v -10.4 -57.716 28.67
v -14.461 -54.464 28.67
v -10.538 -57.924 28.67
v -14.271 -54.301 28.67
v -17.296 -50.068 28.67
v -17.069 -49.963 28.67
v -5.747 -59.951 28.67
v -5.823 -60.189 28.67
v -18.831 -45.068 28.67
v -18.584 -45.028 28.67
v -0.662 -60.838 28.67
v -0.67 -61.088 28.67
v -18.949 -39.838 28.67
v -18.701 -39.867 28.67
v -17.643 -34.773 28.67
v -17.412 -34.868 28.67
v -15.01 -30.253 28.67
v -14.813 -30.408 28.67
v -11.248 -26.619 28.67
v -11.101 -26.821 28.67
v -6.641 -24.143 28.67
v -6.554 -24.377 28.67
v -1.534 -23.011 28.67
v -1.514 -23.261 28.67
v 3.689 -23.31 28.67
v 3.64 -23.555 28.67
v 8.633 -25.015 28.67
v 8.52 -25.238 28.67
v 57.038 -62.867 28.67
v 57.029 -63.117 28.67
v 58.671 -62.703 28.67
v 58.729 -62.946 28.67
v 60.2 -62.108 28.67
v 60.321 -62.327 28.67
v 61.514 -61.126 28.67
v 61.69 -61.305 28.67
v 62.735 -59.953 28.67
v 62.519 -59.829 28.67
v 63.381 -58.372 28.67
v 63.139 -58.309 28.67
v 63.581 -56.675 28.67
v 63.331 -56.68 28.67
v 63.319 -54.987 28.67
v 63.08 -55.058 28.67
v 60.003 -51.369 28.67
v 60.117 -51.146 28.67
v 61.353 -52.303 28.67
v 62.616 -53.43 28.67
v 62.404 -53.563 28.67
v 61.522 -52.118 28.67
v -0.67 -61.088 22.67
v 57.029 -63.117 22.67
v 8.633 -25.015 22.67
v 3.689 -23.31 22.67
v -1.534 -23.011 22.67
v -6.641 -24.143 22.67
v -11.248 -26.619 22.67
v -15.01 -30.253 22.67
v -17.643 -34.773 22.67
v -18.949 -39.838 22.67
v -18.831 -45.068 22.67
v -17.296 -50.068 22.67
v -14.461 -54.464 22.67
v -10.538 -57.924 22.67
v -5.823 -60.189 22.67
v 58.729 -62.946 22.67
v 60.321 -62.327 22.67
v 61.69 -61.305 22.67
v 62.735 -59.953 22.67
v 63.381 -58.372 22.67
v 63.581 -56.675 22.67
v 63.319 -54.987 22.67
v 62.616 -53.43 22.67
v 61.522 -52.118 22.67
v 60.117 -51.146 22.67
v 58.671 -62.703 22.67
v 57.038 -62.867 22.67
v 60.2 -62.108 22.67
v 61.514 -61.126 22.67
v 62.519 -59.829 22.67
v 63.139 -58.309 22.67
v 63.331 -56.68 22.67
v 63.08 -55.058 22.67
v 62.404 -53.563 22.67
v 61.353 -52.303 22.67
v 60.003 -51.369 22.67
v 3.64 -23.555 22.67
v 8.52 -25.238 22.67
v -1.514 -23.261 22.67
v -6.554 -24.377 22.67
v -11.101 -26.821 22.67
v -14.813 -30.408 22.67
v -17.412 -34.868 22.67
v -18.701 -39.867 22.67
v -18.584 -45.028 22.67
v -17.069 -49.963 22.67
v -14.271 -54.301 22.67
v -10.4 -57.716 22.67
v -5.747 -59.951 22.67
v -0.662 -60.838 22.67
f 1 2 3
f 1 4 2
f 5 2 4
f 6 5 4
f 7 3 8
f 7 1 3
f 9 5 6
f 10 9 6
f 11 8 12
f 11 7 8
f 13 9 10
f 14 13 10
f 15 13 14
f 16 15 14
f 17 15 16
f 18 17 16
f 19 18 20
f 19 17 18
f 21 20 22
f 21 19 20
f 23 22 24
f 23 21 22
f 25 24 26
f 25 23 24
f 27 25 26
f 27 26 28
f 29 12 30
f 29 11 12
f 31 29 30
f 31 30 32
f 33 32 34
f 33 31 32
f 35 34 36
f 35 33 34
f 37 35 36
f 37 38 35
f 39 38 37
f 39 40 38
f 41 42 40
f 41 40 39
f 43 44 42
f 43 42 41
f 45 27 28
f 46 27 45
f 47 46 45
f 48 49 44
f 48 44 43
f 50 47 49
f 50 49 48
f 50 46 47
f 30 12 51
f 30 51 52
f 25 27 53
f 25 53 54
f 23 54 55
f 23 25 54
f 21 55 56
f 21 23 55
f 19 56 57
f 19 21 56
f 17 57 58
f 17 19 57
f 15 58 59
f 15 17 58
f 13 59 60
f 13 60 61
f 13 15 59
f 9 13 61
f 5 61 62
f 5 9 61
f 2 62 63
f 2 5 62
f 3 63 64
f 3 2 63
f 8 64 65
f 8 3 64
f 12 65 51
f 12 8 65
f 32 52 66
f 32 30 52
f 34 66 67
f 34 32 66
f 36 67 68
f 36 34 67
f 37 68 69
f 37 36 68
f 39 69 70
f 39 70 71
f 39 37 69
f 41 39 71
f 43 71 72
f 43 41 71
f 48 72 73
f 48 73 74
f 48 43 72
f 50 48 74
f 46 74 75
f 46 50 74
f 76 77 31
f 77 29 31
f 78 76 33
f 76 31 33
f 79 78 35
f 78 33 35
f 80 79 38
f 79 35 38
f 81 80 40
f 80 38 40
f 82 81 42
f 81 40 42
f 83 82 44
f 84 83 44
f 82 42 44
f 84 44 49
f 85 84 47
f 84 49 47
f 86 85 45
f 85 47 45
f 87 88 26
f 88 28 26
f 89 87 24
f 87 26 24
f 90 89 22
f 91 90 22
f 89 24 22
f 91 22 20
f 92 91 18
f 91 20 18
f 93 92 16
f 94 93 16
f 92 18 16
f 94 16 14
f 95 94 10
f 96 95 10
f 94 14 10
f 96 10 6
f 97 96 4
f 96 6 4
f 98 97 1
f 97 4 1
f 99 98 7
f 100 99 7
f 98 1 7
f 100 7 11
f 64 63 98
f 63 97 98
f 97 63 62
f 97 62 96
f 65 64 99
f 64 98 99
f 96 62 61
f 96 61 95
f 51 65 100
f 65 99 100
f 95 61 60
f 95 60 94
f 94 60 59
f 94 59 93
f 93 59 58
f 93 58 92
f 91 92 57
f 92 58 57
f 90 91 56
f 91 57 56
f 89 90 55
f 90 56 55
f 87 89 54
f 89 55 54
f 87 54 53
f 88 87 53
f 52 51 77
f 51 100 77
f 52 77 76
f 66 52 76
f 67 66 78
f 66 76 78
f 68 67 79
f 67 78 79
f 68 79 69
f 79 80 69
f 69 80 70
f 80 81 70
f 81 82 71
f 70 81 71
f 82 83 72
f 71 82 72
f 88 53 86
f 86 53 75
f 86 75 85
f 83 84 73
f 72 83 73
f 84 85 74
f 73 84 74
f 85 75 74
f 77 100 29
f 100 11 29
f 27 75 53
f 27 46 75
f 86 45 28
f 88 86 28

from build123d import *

# Parameters (mm, degrees)
BOSS_EXTRUDE1_DEPTH      = 3
BOSS_EXTRUDE1_DEPTH_BACK = 3


with BuildPart() as part:
    # Sketch1 → Boss-Extrude1 (new, two sides: drawn at the far end of the back side and taken through both)
    with BuildSketch(Plane.XY.offset(25.67).offset(-BOSS_EXTRUDE1_DEPTH_BACK)):
        with BuildLine():
            Line((60.116638829, -51.1464666), (8.633428278, -25.015226292))
            ThreePointArc((8.633428278, -25.015226292), (-18.470533149, -37.260691846), (-0.670439202, -61.087836182))
            Line((-0.670439202, -61.087836182), (57.029169306, -63.117088912))
            ThreePointArc((57.029169306, -63.117088912), (63.381062097, -58.371900532), (60.116638829, -51.1464666))
        make_face()
        with BuildLine():
            Line((60.003487737, -51.369394459), (8.520277187, -25.238154151))
            ThreePointArc((8.520277187, -25.238154151), (-18.228455389, -37.323128676), (-0.661652319, -60.837990648))
            Line((-0.661652319, -60.837990648), (57.037956189, -62.867243378))
            ThreePointArc((57.037956189, -62.867243378), (63.138984336, -58.309463702), (60.003487737, -51.369394459))
        make_face(mode=Mode.SUBTRACT)
    extrude(amount=BOSS_EXTRUDE1_DEPTH + BOSS_EXTRUDE1_DEPTH_BACK)


solid = part.part
